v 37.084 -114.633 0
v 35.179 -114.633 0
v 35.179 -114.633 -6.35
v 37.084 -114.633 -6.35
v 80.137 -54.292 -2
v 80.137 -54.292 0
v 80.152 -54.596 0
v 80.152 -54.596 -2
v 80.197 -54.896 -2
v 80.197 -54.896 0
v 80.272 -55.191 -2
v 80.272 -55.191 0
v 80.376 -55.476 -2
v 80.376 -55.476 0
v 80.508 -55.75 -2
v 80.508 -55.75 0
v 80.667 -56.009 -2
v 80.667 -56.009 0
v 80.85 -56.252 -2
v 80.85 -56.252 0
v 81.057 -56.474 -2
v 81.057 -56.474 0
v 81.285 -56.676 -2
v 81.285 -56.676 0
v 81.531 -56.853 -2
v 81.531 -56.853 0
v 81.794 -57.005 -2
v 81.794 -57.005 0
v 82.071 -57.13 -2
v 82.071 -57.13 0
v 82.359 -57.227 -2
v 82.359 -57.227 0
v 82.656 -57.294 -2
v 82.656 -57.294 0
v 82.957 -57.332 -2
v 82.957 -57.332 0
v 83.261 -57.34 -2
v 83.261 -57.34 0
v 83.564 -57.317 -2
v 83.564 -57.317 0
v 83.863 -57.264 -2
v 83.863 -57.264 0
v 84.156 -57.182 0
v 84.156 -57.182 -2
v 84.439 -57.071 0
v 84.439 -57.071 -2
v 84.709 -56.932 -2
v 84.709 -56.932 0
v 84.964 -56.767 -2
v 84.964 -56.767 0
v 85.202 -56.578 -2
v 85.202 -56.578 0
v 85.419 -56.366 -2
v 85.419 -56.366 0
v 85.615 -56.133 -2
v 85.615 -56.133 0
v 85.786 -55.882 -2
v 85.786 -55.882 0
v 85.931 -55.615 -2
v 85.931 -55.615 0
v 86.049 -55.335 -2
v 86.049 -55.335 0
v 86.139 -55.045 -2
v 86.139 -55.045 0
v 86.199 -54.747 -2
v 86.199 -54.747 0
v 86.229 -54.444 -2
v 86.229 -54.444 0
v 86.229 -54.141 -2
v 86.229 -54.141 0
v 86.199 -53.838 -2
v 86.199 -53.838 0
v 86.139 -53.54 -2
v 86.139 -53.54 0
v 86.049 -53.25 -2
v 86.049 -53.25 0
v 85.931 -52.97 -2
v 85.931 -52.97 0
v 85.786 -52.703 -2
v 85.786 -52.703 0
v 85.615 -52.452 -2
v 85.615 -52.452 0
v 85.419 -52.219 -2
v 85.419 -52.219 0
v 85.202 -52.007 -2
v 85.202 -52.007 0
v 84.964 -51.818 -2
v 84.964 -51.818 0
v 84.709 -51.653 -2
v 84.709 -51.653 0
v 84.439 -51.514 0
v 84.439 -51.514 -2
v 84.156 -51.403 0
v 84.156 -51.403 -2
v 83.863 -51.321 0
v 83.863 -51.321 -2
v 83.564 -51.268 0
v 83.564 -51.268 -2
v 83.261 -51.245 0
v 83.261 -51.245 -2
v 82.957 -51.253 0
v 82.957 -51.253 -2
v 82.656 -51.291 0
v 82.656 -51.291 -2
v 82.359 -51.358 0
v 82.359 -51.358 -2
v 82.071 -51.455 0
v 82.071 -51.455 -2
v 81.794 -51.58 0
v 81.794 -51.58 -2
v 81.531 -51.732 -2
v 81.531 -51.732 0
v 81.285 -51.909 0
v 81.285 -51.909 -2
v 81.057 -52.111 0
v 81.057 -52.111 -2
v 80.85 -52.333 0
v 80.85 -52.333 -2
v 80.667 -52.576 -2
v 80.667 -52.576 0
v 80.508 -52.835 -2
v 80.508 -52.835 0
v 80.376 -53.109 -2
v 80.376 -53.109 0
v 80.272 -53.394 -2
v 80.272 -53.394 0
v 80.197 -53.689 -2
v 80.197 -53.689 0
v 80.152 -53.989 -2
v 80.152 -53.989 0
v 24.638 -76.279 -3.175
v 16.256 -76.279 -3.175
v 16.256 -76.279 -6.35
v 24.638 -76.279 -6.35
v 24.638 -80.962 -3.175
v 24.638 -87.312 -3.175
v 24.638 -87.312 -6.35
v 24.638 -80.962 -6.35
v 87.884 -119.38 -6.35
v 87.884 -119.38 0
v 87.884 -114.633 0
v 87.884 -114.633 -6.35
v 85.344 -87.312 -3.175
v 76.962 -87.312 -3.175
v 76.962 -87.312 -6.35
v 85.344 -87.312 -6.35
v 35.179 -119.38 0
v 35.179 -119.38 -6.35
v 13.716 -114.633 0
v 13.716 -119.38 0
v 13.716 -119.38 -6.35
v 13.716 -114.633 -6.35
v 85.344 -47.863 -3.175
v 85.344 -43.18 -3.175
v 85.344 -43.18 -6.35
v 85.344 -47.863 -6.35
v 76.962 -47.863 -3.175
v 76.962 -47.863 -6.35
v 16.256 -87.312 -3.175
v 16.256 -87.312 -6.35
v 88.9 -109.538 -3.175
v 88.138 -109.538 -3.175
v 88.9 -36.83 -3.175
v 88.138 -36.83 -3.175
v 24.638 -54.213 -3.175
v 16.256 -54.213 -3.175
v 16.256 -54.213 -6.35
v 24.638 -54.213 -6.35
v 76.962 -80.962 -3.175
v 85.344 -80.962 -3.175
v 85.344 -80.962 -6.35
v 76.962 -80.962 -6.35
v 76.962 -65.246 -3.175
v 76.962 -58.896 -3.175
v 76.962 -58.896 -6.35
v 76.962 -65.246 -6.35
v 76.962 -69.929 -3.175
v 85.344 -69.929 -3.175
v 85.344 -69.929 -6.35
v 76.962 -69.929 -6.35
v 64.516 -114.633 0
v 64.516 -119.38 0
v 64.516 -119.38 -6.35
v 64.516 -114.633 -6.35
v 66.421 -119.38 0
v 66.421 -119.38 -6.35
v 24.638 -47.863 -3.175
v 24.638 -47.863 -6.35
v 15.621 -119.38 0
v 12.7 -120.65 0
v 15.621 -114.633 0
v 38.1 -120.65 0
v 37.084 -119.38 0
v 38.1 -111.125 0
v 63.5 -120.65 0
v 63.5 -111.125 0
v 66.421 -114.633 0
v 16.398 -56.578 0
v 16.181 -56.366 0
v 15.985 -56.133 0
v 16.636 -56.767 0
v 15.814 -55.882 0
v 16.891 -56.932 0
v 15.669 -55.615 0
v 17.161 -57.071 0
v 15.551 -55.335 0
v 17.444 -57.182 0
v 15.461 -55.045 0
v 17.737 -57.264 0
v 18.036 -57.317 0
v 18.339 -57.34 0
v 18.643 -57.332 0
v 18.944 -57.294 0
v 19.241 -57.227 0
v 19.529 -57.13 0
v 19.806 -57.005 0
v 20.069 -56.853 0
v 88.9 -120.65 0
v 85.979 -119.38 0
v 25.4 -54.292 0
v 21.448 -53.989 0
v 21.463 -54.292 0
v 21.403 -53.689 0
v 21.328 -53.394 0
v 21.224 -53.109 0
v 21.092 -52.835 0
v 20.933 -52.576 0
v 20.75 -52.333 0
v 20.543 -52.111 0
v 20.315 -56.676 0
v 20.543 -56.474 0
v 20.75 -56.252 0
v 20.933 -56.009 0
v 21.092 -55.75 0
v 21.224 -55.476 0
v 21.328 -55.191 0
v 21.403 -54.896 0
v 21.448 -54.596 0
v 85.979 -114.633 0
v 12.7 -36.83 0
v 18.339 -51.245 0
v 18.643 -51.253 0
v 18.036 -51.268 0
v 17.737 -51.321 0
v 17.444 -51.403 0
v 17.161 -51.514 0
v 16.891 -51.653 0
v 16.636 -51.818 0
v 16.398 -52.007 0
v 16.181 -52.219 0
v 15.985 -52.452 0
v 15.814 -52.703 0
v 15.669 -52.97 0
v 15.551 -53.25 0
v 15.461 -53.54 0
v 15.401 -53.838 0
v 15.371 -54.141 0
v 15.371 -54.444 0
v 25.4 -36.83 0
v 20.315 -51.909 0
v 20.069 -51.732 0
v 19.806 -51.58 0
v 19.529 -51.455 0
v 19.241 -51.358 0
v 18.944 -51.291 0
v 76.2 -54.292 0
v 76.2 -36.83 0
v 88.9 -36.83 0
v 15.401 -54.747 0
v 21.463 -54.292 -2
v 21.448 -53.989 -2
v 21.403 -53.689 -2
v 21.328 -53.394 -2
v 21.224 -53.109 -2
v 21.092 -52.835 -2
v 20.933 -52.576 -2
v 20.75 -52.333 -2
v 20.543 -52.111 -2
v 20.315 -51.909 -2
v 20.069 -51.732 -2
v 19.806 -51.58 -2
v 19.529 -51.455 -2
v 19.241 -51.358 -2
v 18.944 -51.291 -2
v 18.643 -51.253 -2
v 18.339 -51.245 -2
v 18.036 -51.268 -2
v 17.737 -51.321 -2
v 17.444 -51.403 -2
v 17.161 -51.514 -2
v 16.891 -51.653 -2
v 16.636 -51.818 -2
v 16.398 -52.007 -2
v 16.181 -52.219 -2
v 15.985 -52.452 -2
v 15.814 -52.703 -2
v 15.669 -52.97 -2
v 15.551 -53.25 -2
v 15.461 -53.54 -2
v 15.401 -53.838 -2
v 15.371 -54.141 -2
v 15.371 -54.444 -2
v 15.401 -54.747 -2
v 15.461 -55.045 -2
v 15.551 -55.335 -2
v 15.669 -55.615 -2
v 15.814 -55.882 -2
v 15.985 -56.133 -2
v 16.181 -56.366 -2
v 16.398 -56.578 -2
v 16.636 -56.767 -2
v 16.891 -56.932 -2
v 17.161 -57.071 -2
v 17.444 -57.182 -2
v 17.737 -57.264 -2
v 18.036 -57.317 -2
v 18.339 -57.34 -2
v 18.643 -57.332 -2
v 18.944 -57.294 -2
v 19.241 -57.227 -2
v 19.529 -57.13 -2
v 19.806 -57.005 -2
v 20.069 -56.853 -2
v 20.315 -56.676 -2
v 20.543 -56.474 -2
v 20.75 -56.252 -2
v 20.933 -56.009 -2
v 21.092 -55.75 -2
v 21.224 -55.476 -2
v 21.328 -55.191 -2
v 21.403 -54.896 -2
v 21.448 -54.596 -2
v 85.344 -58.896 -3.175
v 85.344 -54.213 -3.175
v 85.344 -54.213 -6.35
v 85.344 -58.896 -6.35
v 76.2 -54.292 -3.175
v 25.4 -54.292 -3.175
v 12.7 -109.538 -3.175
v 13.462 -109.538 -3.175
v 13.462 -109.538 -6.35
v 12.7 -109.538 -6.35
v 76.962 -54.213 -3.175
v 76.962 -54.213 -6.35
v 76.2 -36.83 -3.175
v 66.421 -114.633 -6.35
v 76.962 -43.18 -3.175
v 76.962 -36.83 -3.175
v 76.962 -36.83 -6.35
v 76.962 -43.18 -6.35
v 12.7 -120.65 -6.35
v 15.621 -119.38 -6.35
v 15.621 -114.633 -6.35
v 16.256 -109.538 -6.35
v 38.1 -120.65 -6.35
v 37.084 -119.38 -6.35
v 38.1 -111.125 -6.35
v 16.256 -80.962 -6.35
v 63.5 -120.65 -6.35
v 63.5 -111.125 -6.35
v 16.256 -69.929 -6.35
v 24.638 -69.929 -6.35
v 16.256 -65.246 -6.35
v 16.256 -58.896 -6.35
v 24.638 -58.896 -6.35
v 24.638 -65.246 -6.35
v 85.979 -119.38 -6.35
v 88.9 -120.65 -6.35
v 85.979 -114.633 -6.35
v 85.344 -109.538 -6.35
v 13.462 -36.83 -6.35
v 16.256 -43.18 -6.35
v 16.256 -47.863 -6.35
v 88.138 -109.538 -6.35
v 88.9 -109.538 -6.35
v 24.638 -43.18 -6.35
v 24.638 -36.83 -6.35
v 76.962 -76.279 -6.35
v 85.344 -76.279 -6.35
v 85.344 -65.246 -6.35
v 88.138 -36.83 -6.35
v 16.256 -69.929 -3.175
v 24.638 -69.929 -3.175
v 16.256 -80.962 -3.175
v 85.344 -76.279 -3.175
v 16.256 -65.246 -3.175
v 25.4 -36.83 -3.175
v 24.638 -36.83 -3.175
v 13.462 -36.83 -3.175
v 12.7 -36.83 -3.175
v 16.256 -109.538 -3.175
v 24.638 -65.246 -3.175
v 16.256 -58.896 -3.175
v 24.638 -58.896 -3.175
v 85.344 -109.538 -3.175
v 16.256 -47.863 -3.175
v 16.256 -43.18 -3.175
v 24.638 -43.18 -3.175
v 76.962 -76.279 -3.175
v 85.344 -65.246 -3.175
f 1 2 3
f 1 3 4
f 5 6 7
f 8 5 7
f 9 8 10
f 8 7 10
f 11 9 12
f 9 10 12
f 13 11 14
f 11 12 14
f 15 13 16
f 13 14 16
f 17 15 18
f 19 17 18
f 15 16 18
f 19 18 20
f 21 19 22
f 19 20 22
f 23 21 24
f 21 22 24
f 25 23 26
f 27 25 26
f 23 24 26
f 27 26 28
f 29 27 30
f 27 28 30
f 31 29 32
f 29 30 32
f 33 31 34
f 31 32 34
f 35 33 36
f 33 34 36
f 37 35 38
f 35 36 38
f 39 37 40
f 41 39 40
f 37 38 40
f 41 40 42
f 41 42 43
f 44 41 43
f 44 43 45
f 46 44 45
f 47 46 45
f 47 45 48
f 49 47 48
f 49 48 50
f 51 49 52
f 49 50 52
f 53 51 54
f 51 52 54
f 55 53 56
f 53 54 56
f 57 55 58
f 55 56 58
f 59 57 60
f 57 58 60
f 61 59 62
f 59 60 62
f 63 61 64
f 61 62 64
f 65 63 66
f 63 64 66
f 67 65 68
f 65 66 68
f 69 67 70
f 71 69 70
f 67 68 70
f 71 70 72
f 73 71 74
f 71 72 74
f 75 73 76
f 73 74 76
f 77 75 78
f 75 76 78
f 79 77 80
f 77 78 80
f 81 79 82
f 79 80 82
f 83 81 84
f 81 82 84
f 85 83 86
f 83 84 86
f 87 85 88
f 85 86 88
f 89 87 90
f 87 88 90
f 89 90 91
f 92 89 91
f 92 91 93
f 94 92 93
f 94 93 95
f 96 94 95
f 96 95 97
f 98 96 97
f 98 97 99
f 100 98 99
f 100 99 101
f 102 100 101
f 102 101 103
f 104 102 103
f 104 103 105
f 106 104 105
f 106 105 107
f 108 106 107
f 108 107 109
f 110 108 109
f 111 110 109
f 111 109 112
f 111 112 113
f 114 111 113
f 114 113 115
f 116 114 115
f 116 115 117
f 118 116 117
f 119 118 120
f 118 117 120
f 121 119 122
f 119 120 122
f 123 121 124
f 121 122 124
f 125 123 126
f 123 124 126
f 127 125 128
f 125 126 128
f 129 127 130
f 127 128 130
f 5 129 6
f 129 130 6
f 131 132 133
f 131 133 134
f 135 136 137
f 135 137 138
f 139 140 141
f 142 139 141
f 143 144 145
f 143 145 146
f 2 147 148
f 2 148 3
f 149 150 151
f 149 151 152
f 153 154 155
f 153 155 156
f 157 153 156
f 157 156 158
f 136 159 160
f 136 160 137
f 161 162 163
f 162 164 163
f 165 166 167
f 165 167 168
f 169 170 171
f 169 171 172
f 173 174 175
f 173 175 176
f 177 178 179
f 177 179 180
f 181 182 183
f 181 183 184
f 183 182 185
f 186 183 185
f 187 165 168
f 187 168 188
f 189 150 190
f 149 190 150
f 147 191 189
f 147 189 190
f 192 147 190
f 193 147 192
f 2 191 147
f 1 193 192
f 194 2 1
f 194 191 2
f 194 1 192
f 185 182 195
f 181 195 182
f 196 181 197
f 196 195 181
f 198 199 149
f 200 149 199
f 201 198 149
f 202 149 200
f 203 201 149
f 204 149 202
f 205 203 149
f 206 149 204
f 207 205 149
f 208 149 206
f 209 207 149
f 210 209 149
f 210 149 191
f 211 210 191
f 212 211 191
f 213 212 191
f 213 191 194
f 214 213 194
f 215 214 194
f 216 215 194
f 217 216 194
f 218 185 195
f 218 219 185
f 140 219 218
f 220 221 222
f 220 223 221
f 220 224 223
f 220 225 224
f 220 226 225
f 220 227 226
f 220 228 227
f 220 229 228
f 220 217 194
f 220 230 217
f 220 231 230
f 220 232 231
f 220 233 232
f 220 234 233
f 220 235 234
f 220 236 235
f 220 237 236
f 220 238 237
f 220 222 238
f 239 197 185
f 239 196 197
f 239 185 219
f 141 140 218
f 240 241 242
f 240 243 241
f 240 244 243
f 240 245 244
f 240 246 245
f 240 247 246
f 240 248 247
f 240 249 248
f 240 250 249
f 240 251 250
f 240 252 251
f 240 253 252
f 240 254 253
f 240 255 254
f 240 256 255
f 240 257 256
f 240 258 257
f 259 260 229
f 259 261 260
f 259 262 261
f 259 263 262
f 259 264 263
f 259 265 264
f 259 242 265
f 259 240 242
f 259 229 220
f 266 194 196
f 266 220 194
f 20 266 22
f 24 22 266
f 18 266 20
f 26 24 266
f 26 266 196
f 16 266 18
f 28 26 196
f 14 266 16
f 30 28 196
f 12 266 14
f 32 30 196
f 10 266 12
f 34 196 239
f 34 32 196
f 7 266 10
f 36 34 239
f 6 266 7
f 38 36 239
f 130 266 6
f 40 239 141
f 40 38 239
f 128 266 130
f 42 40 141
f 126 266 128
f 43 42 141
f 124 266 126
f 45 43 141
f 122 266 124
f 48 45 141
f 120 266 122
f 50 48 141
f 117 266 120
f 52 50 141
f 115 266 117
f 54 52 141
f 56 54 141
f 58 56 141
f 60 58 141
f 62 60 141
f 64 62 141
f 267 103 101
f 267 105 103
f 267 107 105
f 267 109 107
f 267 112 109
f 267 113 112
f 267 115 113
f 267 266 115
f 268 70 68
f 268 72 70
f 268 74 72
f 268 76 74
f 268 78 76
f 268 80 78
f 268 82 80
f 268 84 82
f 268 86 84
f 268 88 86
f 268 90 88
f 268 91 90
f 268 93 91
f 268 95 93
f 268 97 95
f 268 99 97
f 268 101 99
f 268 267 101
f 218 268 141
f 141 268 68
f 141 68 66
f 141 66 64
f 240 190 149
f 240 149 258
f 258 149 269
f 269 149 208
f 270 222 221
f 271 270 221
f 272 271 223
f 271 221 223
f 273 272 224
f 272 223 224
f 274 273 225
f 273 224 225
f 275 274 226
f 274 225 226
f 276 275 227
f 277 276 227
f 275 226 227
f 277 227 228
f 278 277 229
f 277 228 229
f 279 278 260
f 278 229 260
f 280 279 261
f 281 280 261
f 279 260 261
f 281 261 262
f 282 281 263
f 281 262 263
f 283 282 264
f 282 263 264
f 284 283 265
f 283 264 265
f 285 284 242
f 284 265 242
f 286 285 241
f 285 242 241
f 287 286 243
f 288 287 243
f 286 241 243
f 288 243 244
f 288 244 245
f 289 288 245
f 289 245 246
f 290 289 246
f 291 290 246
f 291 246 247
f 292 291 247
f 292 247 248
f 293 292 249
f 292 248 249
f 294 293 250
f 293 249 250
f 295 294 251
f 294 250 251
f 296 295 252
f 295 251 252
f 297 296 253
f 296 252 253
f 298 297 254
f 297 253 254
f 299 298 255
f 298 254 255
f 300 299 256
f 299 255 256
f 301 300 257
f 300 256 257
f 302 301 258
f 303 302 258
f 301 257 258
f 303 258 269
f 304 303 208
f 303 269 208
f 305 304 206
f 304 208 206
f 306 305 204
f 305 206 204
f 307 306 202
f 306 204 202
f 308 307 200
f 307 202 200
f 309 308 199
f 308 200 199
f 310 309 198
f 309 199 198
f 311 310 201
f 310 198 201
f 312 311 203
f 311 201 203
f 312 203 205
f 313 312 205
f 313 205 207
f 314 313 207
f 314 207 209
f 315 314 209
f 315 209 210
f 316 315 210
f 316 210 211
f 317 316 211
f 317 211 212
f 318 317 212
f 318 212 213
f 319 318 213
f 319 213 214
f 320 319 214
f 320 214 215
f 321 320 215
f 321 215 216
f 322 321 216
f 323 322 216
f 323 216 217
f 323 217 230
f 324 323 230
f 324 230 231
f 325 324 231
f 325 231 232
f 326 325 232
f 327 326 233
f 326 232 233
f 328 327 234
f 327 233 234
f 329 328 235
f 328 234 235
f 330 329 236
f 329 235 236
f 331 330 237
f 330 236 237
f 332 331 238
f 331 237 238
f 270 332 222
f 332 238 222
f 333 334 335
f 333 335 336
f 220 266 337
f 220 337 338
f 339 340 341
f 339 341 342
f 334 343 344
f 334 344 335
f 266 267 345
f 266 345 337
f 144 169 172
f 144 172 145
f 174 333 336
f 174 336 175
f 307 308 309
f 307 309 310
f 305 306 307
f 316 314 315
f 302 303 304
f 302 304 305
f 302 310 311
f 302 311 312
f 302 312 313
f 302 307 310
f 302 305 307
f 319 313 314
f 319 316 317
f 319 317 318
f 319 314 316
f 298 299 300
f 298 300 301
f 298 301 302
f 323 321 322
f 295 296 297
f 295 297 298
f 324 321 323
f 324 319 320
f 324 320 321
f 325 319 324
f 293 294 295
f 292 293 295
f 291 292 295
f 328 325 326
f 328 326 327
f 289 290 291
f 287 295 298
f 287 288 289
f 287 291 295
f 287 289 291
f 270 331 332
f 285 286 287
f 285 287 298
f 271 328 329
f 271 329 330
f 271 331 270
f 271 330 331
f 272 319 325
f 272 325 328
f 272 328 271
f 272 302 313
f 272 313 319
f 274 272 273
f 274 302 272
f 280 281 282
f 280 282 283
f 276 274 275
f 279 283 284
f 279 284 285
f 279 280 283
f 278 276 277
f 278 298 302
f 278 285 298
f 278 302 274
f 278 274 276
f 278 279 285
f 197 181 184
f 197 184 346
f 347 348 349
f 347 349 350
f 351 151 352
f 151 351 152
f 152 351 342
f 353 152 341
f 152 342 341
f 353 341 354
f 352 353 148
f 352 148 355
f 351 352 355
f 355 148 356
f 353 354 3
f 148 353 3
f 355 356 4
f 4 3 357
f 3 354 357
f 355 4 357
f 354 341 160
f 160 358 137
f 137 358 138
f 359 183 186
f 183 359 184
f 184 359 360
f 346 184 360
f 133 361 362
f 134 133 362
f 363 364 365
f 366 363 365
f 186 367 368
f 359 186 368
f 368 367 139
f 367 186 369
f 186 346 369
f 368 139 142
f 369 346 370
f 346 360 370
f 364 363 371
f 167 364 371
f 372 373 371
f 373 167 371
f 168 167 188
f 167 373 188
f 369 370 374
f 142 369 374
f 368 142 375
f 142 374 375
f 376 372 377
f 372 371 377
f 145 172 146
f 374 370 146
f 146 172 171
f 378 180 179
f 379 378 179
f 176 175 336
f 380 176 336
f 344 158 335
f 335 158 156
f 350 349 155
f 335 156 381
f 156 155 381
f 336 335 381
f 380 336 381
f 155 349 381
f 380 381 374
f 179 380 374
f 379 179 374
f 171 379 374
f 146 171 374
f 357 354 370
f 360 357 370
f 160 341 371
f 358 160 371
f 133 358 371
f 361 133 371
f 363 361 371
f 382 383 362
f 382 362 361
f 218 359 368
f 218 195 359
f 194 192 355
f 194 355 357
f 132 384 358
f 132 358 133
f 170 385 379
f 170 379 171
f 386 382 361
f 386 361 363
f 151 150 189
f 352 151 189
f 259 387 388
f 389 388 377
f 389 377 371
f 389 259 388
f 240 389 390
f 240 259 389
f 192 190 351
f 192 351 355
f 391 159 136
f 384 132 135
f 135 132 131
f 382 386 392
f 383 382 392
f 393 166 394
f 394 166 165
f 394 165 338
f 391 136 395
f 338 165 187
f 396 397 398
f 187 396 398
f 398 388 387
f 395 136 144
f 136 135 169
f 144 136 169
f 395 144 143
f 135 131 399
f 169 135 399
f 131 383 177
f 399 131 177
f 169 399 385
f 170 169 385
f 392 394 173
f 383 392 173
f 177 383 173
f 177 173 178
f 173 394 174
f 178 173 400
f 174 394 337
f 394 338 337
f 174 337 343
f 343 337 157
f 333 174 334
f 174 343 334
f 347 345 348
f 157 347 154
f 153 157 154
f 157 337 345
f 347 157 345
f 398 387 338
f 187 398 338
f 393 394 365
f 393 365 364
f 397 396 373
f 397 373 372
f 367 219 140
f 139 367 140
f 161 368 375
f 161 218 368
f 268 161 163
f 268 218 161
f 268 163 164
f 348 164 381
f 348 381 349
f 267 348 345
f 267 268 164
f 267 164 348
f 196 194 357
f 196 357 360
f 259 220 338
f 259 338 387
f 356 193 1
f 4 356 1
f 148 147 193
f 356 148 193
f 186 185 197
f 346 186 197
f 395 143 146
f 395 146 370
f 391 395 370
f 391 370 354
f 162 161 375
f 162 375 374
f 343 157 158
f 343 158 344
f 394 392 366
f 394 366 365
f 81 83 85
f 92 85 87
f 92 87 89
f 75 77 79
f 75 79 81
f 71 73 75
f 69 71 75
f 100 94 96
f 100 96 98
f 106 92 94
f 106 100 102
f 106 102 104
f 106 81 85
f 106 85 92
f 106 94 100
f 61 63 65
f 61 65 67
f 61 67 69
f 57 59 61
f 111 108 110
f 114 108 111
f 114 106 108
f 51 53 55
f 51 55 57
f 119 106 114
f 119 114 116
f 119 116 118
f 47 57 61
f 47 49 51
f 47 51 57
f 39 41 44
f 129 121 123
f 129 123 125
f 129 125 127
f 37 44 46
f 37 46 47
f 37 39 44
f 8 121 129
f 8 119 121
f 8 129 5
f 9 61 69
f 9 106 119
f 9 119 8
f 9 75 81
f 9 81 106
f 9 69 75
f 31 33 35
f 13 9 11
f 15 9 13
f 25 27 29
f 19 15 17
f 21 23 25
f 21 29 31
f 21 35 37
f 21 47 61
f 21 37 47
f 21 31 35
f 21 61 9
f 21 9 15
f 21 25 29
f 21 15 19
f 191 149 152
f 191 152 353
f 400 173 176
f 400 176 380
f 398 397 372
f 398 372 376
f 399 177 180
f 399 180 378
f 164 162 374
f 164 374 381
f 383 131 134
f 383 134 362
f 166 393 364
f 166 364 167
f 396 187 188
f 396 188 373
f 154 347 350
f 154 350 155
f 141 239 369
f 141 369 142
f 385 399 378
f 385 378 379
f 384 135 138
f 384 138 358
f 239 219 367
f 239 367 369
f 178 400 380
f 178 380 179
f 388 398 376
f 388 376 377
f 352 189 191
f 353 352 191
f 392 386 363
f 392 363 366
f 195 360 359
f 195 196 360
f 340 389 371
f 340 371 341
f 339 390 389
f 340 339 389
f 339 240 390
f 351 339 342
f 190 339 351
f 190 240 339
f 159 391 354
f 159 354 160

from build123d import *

# Parameters (mm, degrees)
BASE_DEPTH              = 3.175
SECOND_LAYER_DEPTH      = 3.175
SKETCH6_R               = 3.048
MAGNET_HOLDER_DEPTH     = 2
SKETCH7_W               = 1.905
SKETCH7_H               = 4.74726
SMALL_MAGNETS_CUT_DEPTH = 6.35


with BuildPart() as part:
    # Sketch1 → base (new body)
    with BuildSketch(Plane.XY):
        Polygon((88.9, -120.65), (88.9, -36.83), (76.2, -36.83), (76.2, -54.2925), (25.4, -54.2925), (25.4, -36.83), (12.7, -36.83), (12.7, -120.65), (38.1, -120.65), (38.1, -111.125), (63.5, -111.125), (63.5, -120.65), align=None)
    extrude(amount=-BASE_DEPTH)

    # Sketch2 → second layer (add)
    with BuildSketch(Plane(origin=(0, 0, -3.175), x_dir=(-1, 0, 0), z_dir=(0, 0, -1))):
        Polygon((-88.9, -120.65), (-88.9, -109.5375), (-88.138, -109.5375), (-88.138, -36.83), (-76.962, -36.83), (-76.962, -43.18), (-85.344, -43.18), (-85.344, -47.863125), (-76.962, -47.863125), (-76.962, -54.213125), (-85.344, -54.213125), (-85.344, -58.89625), (-76.962, -58.89625), (-76.962, -65.24625), (-85.344, -65.24625), (-85.344, -69.929375), (-76.962, -69.929375), (-76.962, -76.279375), (-85.344, -76.279375), (-85.344, -80.9625), (-76.962, -80.9625), (-76.962, -87.3125), (-85.344, -87.3125), (-85.344, -109.5375), (-16.256, -109.5375), (-16.256, -87.3125), (-24.638, -87.3125), (-24.638, -80.9625), (-16.256, -80.9625), (-16.256, -76.279375), (-24.638, -76.279375), (-24.638, -69.929375), (-16.256, -69.929375), (-16.256, -65.24625), (-24.638, -65.24625), (-24.638, -58.89625), (-16.256, -58.89625), (-16.256, -54.213125), (-24.638, -54.213125), (-24.638, -47.863125), (-16.256, -47.863125), (-16.256, -43.18), (-24.638, -43.18), (-24.638, -36.83), (-13.462, -36.83), (-13.462, -109.5375), (-12.7, -109.5375), (-12.7, -120.65), (-38.1, -120.65), (-38.1, -111.125), (-63.5, -111.125), (-63.5, -120.65), align=None)
    extrude(amount=SECOND_LAYER_DEPTH)

    # Sketch6 → magnet holder (cut)
    with BuildSketch(Plane.XY):
        with Locations((18.415, -54.2925)):
            Circle(SKETCH6_R)
        with Locations(Location((83.185, -54.2925, 0), (0, 0, 180))):  # turned: the seam where the file's is
            Circle(SKETCH6_R)
    extrude(amount=-MAGNET_HOLDER_DEPTH, mode=Mode.SUBTRACT)

    # Sketch7 → small magnets cut (cut)
    with BuildSketch(Plane.XY):
        with Locations((14.6685, -117.00637)):
            Rectangle(SKETCH7_W, SKETCH7_H)
        with Locations((36.1315, -117.00637)):
            Rectangle(SKETCH7_W, SKETCH7_H)
        with Locations((65.4685, -117.00637)):
            Rectangle(SKETCH7_W, SKETCH7_H)
        with Locations((86.9315, -117.00637)):
            Rectangle(SKETCH7_W, SKETCH7_H)
    extrude(amount=-SMALL_MAGNETS_CUT_DEPTH, mode=Mode.SUBTRACT)


solid = part.part
